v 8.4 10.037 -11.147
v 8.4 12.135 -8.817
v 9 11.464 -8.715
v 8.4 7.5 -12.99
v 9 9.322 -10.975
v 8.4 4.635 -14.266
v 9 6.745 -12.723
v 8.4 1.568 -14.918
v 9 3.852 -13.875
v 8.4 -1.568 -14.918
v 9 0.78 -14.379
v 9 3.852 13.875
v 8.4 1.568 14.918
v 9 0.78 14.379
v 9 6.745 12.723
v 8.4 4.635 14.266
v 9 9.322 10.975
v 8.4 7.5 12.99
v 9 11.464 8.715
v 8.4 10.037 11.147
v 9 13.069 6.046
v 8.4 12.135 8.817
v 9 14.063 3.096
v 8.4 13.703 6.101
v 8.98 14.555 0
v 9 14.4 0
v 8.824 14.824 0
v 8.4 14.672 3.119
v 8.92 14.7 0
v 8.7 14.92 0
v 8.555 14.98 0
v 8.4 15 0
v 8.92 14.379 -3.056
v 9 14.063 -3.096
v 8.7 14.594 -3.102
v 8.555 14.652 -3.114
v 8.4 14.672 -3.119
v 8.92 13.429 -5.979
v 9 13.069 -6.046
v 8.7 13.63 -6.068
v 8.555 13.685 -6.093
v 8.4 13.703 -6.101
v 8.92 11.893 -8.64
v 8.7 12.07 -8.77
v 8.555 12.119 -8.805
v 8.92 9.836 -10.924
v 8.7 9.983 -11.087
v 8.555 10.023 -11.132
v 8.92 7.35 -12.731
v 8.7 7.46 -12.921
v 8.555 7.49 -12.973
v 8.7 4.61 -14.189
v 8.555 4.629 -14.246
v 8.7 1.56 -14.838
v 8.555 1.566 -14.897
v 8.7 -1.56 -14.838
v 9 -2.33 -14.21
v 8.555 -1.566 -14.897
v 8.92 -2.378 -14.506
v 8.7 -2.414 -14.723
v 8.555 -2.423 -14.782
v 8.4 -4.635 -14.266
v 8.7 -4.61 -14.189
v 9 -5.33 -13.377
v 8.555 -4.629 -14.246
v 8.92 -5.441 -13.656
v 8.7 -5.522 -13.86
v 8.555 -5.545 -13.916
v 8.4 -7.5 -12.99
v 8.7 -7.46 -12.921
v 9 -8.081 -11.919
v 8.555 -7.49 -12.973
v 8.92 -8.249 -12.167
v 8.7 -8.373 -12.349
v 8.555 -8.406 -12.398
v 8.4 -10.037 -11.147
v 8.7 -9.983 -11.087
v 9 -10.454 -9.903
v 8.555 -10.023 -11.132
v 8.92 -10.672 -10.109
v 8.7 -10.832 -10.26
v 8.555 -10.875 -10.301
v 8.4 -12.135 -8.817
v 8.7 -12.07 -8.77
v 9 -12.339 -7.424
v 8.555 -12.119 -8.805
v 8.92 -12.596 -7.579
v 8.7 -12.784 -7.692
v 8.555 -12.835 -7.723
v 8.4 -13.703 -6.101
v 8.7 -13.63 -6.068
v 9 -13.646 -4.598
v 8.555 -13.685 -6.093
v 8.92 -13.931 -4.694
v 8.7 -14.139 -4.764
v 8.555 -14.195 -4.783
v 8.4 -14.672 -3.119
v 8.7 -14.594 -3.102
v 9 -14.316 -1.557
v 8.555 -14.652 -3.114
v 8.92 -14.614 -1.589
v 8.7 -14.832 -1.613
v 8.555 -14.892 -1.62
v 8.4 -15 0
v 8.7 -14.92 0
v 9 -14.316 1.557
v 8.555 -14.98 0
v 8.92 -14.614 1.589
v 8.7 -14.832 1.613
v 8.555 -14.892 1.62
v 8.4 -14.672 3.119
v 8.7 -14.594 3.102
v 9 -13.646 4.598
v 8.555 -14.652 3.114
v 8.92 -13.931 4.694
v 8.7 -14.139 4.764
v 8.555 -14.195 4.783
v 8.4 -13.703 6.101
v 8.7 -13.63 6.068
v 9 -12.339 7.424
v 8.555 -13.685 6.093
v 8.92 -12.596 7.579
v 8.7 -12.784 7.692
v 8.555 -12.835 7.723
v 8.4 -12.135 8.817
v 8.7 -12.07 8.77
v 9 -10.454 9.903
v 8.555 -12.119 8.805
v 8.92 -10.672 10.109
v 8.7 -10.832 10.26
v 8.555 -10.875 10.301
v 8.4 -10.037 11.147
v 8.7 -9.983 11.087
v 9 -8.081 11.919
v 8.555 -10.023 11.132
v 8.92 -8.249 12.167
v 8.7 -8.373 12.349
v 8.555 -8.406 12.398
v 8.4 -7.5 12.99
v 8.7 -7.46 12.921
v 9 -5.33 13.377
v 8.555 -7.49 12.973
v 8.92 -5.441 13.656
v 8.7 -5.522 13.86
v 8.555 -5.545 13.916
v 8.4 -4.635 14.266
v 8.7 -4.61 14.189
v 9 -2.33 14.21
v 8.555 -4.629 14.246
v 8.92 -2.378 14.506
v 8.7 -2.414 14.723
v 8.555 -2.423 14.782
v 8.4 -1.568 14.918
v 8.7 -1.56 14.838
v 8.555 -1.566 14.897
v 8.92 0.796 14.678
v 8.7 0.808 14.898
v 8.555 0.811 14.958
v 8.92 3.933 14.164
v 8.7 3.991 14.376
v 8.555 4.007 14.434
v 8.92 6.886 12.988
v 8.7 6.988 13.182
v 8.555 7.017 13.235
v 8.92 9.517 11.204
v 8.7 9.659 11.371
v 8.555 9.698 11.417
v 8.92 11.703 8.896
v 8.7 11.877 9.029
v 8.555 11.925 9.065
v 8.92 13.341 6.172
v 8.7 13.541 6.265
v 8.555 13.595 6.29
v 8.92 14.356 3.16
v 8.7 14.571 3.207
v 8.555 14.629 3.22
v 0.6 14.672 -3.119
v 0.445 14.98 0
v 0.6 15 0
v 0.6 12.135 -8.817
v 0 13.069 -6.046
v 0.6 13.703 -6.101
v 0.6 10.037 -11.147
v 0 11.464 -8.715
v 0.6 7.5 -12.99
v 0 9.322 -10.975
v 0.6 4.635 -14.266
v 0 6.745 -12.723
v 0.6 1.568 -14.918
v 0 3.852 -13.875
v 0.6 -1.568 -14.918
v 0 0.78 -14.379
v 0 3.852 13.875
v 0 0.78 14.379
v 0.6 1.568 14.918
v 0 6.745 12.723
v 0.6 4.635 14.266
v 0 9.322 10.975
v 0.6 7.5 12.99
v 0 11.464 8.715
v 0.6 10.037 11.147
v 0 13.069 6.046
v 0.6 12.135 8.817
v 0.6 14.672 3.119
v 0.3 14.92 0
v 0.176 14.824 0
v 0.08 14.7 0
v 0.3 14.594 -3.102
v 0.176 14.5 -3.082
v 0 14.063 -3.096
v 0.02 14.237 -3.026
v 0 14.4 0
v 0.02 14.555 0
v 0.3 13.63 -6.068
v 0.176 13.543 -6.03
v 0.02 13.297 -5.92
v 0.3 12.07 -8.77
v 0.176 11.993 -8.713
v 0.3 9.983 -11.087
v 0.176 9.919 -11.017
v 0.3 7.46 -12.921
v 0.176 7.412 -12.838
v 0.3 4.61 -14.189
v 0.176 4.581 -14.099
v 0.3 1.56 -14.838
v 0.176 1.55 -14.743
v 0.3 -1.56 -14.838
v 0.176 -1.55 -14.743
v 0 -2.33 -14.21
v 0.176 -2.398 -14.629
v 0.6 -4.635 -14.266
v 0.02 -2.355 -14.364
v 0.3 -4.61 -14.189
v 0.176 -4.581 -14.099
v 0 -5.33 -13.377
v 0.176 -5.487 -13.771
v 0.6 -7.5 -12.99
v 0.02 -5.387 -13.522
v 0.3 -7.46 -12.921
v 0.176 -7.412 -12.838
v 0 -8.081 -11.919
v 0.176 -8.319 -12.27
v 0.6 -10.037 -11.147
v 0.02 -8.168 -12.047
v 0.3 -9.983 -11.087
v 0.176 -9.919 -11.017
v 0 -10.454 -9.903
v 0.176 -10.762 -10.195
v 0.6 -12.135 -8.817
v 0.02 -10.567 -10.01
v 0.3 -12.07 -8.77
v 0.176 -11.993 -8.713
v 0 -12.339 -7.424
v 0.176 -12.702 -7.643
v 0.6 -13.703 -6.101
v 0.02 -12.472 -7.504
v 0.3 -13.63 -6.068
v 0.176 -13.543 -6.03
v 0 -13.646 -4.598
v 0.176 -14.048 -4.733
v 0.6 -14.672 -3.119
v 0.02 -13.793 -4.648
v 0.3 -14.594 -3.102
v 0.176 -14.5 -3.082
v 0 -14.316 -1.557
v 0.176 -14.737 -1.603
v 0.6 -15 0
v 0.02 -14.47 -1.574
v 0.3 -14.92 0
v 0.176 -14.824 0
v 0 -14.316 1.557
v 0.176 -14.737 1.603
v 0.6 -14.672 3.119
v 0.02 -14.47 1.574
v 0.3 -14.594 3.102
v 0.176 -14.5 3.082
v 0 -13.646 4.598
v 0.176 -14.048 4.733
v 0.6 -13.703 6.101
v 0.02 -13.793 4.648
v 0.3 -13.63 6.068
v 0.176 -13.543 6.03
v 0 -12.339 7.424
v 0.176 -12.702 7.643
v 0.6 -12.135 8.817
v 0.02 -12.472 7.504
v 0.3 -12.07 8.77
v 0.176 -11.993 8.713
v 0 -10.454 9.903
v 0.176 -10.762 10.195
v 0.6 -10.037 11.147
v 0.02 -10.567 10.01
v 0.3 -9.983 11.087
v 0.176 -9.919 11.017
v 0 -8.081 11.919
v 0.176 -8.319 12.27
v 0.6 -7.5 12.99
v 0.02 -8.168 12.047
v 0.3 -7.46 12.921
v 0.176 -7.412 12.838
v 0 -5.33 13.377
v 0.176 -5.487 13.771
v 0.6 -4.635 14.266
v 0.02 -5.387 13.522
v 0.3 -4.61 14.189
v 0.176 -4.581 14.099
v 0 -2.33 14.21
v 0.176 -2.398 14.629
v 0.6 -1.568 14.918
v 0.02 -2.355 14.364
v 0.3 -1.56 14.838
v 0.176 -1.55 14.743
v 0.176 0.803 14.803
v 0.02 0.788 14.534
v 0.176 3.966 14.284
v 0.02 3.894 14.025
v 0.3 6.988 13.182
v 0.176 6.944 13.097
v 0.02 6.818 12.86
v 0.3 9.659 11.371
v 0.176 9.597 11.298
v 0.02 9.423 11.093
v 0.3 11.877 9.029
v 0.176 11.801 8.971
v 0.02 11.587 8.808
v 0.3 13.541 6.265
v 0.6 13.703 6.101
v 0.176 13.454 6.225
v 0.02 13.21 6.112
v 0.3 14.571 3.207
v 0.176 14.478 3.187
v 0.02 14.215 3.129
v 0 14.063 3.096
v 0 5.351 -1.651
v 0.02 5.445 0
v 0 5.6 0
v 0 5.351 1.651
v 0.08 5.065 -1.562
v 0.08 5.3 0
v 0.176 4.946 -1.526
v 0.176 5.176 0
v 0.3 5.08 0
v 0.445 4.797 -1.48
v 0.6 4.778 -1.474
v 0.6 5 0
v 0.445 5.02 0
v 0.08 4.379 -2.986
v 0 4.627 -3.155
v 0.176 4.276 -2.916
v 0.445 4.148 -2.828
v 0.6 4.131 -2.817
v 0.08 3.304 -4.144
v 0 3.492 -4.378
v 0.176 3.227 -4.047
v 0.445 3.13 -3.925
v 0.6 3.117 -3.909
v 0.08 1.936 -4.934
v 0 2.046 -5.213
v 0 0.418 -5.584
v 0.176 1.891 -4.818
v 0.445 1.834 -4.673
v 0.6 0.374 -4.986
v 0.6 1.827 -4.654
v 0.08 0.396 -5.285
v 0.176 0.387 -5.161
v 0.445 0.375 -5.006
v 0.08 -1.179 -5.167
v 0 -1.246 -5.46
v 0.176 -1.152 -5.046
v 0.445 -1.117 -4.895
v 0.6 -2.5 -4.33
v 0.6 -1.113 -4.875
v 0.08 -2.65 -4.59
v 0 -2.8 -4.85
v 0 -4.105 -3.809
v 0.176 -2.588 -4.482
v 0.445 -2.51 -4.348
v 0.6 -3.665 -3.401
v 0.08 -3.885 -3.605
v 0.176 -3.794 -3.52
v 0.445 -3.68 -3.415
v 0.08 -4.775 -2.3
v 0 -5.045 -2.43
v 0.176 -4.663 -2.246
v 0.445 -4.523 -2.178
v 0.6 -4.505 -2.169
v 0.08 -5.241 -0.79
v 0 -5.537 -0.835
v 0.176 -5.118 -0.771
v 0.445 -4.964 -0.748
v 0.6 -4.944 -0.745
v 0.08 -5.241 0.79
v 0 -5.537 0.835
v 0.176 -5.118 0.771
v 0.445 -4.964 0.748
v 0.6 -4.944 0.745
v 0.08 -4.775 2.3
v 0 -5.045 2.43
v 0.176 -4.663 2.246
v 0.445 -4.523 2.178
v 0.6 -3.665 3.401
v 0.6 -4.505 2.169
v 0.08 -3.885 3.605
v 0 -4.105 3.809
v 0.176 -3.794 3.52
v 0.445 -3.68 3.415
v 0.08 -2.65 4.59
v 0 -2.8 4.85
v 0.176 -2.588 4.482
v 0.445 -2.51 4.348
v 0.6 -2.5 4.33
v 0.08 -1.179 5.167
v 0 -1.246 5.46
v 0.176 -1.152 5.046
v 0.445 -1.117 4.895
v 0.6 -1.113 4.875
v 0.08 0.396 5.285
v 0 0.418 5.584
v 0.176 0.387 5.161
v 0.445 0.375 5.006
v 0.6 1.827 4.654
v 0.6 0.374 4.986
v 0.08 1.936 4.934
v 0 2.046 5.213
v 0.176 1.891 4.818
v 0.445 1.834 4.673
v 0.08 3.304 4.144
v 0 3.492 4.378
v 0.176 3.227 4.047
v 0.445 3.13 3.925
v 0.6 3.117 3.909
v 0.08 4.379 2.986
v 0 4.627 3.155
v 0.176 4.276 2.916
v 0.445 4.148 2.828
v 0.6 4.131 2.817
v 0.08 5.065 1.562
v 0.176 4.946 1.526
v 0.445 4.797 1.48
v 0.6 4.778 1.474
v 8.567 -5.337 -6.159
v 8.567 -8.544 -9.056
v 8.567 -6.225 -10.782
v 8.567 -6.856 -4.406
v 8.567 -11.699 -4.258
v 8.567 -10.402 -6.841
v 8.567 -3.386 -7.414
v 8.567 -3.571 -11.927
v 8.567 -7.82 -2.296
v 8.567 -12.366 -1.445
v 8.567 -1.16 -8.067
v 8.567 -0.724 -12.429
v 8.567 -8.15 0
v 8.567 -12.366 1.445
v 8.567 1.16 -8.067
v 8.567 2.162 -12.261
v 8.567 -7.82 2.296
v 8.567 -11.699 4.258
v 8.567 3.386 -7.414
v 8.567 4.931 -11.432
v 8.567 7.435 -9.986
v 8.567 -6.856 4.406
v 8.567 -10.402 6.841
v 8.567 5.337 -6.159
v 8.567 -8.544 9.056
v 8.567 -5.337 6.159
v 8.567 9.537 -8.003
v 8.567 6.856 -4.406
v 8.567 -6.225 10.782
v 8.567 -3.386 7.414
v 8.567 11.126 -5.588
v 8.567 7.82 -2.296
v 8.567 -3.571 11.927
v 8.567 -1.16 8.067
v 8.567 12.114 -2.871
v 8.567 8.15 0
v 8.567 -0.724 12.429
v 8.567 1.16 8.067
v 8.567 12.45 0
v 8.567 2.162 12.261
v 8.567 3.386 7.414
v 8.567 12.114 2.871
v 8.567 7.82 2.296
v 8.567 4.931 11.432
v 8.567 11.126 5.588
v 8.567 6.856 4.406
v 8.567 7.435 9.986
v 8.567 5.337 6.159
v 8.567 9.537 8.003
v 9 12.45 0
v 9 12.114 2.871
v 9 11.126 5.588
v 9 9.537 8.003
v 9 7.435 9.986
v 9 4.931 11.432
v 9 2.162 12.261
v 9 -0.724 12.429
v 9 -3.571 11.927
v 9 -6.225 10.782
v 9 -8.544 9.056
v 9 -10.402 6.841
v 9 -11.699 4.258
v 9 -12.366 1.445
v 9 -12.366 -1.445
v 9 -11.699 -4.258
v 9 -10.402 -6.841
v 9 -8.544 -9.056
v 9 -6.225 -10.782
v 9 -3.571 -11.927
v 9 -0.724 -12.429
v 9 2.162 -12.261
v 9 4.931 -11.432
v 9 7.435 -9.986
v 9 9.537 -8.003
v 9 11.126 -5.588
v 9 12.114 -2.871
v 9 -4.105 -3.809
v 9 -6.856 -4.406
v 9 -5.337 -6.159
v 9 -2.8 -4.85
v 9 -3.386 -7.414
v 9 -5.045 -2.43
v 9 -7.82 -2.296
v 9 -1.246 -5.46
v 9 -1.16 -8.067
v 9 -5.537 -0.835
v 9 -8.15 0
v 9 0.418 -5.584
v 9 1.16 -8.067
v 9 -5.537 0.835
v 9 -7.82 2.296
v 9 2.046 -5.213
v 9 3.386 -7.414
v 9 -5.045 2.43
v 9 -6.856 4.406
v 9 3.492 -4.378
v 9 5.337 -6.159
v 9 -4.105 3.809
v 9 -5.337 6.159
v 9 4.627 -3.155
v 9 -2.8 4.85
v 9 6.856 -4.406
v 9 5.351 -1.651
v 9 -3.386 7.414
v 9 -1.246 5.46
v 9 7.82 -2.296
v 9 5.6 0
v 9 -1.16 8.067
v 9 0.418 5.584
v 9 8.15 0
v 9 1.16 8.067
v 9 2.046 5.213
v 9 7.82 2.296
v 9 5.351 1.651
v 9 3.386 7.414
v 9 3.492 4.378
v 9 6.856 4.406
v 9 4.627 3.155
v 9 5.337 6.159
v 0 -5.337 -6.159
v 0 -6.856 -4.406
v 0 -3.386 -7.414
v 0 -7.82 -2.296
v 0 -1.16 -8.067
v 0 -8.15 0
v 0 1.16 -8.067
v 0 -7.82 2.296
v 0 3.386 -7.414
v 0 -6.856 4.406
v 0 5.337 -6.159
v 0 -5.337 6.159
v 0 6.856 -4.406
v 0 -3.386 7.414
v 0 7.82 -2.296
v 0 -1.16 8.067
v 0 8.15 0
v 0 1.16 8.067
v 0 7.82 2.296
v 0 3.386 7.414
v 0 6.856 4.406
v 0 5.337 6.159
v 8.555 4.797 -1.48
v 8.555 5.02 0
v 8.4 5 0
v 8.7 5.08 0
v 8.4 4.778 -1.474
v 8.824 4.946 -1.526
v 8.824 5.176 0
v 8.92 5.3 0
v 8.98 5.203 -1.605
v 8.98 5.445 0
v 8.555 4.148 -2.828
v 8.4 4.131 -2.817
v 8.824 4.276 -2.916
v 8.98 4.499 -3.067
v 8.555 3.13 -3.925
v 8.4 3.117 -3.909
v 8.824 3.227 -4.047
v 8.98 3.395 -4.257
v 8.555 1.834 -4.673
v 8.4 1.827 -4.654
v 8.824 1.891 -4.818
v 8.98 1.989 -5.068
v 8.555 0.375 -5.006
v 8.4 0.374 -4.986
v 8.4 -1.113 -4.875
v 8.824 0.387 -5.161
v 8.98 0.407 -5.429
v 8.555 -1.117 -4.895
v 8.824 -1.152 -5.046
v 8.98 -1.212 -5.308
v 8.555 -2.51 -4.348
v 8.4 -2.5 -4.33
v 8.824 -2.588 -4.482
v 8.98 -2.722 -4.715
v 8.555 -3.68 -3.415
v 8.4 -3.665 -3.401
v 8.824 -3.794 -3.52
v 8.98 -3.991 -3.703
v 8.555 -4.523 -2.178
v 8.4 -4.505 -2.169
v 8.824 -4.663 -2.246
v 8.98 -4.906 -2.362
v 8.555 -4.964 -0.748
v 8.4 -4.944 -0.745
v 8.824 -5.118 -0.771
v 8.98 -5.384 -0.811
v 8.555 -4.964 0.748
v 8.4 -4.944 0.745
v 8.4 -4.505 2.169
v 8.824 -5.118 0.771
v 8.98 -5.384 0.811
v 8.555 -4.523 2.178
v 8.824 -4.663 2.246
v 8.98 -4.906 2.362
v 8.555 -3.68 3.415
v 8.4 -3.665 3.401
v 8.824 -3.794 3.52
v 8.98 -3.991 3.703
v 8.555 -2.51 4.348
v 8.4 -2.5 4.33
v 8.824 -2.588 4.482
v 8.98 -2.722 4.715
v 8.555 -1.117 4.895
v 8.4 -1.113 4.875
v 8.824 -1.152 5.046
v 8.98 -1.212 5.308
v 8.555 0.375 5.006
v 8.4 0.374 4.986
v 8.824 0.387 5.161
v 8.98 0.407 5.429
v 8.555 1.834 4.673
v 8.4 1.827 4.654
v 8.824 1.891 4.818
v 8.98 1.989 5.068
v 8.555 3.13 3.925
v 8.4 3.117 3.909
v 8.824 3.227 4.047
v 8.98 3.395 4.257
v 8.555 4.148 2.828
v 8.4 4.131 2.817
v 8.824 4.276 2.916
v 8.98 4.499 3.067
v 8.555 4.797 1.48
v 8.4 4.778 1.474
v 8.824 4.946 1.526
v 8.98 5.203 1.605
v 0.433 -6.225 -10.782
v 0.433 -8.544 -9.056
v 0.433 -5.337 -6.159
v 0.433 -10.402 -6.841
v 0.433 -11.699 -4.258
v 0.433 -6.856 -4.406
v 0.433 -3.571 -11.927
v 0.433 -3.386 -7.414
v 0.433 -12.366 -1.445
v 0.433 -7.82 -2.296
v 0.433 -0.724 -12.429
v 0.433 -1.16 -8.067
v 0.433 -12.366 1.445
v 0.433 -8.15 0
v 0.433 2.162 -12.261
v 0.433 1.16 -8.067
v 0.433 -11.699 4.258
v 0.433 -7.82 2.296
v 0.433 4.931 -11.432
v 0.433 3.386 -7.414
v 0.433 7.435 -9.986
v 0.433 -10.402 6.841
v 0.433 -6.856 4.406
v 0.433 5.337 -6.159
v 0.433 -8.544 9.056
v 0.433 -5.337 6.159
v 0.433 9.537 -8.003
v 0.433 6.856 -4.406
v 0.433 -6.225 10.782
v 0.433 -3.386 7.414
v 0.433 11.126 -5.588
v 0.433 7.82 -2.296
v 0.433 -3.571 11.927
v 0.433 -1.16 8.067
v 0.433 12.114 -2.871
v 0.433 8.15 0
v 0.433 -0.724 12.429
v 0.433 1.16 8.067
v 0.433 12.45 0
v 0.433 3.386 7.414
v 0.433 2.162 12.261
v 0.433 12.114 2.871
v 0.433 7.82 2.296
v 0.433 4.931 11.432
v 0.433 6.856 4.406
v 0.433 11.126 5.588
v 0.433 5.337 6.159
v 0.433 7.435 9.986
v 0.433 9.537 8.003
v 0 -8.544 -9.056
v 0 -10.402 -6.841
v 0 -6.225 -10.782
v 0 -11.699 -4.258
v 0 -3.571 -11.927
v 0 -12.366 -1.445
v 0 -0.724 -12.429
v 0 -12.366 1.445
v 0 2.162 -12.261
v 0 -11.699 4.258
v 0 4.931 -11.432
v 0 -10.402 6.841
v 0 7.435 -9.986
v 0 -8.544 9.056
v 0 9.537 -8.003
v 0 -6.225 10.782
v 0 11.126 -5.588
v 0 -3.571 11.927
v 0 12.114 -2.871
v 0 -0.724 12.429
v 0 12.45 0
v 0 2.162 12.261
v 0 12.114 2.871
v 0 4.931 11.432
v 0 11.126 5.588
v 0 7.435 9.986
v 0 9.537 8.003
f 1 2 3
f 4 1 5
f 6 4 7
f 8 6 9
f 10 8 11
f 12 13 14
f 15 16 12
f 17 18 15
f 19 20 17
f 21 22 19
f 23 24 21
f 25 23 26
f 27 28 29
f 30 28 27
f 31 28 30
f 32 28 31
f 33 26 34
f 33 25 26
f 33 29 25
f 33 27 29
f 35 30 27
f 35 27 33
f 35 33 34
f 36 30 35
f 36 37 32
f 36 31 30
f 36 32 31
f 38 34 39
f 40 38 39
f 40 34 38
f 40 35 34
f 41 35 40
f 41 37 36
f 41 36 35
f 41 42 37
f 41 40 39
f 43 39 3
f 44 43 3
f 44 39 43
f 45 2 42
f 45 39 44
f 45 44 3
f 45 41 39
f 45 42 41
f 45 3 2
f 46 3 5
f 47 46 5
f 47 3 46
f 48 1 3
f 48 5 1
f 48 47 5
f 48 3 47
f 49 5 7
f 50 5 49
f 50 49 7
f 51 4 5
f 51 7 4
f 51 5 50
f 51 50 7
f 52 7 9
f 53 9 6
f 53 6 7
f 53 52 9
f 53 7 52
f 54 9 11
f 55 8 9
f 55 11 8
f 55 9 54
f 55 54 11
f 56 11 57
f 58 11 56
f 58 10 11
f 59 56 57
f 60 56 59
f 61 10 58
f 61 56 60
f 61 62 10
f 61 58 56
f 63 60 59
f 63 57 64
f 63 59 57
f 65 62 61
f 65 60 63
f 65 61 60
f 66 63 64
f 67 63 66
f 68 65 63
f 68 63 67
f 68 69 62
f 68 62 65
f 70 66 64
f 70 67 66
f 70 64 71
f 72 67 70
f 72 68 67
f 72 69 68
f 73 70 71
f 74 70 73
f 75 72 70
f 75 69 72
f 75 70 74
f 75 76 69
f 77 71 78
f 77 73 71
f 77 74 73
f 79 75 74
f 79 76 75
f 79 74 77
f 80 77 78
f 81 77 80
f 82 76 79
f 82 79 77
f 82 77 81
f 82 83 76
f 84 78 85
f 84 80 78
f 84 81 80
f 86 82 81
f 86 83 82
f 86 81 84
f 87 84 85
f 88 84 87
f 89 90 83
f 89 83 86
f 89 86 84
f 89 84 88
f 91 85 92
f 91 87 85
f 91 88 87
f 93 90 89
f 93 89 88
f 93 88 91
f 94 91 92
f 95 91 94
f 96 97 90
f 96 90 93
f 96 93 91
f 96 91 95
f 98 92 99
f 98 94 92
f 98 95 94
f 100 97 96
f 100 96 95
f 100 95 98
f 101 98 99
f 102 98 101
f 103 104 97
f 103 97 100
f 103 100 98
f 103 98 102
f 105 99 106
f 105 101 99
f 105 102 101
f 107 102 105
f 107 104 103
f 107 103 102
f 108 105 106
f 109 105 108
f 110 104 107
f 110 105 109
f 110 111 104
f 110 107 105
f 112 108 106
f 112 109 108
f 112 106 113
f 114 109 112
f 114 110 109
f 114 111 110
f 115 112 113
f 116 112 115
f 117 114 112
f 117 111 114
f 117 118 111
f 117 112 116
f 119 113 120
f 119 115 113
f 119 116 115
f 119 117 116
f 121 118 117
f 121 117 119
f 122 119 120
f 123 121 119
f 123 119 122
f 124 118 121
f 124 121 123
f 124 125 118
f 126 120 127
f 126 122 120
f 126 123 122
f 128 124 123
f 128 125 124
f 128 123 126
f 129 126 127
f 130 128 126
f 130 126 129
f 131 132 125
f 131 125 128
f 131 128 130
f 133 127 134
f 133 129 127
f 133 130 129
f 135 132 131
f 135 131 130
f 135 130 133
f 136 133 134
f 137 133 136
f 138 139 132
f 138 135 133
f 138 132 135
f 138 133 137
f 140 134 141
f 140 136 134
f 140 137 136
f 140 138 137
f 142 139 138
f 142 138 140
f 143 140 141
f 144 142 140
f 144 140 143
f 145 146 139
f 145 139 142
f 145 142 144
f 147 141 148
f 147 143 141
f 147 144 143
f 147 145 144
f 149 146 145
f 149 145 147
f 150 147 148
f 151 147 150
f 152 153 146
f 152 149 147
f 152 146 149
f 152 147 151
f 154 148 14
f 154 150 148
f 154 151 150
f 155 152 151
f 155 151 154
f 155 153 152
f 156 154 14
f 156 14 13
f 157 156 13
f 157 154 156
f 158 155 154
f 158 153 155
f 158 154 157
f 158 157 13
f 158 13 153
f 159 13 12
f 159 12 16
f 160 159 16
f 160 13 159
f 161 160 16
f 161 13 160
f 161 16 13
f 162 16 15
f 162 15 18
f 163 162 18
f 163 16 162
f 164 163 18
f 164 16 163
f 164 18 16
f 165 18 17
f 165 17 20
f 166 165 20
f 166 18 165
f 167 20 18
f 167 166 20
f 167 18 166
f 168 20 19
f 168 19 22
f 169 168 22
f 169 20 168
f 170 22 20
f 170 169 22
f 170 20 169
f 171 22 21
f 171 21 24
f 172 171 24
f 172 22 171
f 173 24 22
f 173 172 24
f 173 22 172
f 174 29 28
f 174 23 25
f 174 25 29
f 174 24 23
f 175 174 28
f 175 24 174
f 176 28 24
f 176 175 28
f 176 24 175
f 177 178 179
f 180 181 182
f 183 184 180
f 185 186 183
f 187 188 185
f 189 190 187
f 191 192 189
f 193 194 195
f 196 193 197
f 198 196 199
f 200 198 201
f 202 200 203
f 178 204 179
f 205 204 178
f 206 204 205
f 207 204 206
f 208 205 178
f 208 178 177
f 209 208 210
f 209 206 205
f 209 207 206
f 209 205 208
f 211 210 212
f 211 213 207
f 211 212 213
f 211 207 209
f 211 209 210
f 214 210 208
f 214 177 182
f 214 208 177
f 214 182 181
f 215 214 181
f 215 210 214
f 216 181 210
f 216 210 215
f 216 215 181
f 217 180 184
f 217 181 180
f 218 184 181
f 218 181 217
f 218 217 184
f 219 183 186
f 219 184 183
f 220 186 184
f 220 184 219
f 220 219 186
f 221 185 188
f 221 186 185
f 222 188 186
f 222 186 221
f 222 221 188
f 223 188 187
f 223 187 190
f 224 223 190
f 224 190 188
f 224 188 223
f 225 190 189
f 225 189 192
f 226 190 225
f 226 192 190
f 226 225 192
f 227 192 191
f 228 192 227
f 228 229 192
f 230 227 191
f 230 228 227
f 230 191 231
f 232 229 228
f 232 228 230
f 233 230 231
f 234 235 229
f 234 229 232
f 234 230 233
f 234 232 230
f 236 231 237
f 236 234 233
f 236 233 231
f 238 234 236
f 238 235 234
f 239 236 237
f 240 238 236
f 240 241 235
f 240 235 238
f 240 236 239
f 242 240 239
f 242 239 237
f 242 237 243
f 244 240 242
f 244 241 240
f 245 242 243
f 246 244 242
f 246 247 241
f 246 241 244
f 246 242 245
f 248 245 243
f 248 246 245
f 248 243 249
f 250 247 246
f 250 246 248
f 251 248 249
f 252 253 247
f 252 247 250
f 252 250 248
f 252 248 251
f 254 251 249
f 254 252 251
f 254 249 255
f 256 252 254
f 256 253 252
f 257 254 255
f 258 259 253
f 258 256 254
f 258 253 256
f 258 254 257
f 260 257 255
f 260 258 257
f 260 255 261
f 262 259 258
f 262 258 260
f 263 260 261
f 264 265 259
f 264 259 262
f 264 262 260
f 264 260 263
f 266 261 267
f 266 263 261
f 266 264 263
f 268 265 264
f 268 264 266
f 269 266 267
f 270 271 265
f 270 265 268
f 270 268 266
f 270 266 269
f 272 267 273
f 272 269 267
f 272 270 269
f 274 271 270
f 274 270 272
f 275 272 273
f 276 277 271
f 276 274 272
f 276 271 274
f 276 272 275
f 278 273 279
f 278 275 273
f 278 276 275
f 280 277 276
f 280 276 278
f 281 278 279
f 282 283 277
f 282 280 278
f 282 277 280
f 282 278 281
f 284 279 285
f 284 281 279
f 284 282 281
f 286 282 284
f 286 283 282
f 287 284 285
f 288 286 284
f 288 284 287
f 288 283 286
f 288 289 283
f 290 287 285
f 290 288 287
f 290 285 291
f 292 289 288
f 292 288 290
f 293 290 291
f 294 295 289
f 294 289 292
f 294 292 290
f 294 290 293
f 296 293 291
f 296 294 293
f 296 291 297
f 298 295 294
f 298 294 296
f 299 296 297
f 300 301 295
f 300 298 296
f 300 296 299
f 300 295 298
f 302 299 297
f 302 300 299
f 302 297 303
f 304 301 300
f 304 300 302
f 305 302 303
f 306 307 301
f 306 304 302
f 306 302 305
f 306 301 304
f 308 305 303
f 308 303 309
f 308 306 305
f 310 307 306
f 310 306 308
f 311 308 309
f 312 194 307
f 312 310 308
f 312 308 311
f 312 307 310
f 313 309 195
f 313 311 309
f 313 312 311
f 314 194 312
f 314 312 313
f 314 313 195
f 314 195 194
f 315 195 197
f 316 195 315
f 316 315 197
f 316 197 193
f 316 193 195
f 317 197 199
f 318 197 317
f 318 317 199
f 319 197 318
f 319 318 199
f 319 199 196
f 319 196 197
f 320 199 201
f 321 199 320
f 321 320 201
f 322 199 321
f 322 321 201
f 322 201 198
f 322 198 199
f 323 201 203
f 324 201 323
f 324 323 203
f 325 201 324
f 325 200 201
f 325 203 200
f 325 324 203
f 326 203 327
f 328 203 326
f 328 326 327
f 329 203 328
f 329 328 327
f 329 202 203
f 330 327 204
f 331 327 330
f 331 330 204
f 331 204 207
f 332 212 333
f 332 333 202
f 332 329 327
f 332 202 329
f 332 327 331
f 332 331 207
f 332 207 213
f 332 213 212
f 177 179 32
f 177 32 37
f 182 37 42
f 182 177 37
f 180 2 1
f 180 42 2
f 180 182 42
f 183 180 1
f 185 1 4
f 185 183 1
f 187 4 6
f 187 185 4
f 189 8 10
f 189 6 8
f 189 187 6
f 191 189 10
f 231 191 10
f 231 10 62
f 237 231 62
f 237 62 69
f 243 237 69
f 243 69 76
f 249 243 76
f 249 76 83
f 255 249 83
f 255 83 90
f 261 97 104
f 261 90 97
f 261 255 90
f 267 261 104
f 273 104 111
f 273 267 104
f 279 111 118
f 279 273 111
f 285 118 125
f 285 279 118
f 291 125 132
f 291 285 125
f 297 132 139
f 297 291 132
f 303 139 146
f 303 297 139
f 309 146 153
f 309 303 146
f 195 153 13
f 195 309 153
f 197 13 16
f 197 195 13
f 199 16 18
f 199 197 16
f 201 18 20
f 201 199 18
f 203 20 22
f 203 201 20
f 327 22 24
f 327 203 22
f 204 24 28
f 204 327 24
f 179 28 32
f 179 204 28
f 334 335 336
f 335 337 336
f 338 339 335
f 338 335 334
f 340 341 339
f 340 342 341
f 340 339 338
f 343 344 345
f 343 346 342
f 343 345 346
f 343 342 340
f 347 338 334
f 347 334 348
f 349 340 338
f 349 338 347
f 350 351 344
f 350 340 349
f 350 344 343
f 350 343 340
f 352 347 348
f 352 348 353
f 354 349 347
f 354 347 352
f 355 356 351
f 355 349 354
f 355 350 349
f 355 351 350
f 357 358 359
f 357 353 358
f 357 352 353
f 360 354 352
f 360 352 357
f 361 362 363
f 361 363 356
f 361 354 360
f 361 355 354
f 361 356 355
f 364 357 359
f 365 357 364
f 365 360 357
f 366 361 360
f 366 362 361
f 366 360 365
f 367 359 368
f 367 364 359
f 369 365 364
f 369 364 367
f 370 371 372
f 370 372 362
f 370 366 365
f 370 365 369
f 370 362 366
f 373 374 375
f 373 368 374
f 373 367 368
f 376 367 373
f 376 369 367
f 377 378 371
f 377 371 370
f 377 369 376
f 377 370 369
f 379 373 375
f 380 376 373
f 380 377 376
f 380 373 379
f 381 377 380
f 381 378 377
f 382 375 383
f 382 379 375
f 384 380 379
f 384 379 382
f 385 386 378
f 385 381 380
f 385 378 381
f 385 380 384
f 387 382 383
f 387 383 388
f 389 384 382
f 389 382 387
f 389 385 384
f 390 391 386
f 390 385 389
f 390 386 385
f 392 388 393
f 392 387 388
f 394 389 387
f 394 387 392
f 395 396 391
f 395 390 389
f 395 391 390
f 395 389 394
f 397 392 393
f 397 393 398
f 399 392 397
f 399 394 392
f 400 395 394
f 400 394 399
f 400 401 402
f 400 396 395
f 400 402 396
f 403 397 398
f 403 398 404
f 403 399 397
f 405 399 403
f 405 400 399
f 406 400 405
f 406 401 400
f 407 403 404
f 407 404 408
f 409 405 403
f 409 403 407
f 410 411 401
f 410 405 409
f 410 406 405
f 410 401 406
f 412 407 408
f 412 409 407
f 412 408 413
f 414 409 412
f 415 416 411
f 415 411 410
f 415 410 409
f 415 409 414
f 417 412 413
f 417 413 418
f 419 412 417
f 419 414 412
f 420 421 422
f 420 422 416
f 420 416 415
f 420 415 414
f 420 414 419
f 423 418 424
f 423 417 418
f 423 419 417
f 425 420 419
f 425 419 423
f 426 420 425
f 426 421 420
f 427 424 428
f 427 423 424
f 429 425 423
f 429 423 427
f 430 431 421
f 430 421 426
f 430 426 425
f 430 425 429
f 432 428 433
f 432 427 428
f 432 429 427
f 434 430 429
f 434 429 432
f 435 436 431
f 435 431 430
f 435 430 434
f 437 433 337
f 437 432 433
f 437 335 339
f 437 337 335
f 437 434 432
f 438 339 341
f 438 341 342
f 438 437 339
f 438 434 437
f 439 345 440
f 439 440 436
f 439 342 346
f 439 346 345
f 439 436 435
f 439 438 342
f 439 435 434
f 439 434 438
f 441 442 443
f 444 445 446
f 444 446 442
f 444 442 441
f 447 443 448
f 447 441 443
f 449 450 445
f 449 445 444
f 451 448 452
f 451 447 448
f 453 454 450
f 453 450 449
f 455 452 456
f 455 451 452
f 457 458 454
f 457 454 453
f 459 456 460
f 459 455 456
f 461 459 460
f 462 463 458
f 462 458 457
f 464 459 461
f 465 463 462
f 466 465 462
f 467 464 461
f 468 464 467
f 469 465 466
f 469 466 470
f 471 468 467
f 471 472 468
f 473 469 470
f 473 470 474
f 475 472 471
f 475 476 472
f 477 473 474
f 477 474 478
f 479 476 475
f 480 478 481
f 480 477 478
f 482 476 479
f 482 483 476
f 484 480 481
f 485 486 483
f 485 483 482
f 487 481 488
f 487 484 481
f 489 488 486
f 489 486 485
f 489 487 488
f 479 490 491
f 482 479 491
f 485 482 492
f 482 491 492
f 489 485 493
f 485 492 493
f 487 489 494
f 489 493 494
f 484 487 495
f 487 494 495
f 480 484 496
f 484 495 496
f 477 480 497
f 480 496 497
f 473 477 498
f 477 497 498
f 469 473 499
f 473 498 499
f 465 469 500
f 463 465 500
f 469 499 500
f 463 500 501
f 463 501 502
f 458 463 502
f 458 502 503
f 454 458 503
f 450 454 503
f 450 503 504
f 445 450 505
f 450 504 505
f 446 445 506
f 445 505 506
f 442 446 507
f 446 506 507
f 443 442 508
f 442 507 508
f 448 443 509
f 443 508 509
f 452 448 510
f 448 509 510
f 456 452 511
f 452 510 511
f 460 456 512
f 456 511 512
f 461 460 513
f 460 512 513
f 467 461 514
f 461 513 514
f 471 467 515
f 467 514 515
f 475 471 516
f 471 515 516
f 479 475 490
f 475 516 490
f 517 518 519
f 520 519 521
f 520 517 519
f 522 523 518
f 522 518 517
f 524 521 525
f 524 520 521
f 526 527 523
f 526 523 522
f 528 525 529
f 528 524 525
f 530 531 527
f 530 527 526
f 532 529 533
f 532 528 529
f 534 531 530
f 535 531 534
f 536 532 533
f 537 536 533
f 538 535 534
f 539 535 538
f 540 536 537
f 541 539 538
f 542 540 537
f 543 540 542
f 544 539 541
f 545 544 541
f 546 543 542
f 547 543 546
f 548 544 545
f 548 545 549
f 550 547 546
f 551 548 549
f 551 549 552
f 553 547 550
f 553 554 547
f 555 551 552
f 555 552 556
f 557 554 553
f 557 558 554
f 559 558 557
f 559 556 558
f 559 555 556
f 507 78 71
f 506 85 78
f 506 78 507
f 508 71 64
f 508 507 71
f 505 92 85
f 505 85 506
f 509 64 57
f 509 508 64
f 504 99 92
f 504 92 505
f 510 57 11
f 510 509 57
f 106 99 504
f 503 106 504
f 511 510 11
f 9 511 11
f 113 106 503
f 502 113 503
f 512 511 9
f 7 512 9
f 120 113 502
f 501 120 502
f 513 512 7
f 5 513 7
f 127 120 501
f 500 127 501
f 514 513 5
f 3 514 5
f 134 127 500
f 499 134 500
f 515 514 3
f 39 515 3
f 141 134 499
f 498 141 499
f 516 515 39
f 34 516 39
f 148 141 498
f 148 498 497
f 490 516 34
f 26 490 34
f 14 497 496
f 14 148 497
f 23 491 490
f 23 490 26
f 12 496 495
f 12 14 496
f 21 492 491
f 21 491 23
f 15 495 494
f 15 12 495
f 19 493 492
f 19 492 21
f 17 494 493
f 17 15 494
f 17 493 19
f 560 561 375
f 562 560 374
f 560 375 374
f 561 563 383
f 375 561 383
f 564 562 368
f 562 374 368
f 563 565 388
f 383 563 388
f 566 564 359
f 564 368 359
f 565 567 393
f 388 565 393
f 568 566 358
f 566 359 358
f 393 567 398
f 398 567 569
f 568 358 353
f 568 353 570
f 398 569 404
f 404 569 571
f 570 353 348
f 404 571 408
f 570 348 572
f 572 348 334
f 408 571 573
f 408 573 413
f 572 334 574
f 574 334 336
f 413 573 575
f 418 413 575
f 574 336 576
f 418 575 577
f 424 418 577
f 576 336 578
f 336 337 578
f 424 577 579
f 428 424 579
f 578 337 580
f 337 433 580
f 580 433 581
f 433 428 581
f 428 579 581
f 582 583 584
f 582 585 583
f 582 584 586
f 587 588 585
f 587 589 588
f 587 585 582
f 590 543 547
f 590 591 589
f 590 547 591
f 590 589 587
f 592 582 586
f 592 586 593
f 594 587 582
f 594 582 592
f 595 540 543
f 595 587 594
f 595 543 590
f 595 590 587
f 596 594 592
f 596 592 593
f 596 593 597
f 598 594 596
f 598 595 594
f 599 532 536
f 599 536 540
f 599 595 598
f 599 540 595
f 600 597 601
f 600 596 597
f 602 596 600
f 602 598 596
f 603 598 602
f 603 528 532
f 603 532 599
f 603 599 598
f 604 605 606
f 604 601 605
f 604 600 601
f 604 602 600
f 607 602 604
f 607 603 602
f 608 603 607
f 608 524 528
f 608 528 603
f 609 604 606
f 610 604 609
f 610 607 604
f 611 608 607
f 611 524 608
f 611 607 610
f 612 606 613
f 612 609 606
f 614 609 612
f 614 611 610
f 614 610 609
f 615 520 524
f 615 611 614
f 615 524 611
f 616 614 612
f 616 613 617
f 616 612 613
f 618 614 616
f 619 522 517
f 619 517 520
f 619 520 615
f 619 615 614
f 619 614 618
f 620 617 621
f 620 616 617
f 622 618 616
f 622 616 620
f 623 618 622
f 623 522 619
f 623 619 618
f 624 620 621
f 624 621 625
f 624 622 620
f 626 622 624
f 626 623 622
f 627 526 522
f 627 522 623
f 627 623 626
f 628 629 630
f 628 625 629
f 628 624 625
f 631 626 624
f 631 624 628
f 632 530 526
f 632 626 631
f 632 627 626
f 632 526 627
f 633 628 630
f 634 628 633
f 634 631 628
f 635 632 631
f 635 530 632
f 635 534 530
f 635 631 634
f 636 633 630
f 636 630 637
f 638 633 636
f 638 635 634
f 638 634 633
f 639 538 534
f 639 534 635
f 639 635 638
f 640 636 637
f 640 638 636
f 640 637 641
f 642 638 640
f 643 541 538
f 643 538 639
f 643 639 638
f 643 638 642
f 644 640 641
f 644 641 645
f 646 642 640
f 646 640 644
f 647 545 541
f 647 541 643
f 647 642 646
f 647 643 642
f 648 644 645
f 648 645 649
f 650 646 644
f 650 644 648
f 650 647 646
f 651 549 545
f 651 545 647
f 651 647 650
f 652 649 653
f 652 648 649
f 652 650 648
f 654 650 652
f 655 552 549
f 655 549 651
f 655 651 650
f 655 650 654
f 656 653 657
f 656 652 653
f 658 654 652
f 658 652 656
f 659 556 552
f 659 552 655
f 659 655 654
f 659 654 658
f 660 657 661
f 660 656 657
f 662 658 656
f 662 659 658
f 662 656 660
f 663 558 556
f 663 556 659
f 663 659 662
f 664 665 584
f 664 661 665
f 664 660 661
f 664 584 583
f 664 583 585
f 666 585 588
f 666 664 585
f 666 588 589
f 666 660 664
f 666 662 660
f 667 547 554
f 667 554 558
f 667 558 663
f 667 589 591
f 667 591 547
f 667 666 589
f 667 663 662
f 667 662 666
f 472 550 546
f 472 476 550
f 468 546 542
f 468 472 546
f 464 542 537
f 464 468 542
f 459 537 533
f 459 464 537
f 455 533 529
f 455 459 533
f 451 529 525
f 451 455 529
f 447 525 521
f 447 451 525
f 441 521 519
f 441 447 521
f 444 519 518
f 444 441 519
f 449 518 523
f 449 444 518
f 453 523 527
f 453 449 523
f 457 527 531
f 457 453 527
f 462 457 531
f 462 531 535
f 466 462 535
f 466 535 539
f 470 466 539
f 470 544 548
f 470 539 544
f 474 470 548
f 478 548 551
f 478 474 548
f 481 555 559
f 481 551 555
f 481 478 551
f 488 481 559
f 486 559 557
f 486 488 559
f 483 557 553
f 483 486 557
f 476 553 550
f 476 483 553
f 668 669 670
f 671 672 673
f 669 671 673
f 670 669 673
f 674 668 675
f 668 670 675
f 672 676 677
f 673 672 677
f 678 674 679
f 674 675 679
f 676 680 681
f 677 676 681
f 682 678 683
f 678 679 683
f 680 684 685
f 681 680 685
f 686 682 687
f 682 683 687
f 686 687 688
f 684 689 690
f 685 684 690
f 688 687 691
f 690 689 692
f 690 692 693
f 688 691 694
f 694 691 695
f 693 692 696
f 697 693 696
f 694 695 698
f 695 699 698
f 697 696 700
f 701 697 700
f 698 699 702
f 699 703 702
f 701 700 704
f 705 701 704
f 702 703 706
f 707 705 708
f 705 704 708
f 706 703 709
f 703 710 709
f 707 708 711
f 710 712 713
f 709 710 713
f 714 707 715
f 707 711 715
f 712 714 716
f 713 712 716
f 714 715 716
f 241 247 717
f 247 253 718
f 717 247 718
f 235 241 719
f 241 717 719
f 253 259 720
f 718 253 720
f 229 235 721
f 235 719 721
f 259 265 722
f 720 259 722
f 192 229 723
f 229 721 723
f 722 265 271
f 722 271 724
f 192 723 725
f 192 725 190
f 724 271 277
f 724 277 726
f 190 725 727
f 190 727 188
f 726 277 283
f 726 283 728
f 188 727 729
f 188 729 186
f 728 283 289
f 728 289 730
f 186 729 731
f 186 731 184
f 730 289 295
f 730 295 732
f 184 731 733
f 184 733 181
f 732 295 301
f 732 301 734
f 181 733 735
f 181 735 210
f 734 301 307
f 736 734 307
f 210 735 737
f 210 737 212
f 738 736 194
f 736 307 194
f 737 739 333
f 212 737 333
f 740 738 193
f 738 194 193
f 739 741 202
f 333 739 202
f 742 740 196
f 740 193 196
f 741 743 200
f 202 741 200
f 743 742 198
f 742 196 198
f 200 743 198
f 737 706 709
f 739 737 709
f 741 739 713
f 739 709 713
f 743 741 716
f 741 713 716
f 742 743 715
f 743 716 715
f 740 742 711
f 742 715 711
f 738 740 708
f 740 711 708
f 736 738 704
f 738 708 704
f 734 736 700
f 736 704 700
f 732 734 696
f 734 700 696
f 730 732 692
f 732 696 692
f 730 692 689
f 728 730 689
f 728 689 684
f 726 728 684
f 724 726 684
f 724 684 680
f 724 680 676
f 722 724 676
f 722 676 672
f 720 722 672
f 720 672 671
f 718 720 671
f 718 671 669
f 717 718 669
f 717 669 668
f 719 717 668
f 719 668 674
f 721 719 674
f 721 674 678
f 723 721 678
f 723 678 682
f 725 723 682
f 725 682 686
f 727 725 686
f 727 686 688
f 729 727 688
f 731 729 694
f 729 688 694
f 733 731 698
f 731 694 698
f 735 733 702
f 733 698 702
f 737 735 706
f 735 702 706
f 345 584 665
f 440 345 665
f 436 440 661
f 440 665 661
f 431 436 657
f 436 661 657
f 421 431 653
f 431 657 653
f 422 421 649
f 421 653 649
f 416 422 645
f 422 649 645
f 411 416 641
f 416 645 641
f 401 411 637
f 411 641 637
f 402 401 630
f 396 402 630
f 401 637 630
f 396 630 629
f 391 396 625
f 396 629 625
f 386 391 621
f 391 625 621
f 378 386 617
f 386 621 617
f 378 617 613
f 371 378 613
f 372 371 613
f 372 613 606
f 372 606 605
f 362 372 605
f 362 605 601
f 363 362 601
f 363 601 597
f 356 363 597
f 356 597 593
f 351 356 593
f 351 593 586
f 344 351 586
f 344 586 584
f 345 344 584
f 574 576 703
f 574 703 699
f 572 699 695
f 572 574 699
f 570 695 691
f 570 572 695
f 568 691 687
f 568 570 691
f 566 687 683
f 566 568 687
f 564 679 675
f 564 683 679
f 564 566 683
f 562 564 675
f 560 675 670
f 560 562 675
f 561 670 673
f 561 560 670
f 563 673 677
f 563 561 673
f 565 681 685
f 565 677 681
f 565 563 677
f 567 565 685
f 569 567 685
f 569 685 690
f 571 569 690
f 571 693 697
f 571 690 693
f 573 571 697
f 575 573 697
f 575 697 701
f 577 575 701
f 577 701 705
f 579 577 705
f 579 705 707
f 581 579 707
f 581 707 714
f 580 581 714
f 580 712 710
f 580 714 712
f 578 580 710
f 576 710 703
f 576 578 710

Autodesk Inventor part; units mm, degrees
sketch "Sketch_1" plane through (0, 0, 0) normal (0, 0, 1) x (1, 0, 0)
  line L0 (9, 0) -> (0, 0)
  arc A0 (0, 5.6) -> (0.6, 5) centre (0.6, 5.6) ccw
  line L1 (0.6, 5) -> (8.4, 5)
  arc A1 (8.4, 5) -> (9, 5.6) centre (8.4, 5.6) ccw
  line L2 (9, 5.6) -> (9, 8.15)
  line L3 (9, 8.15) -> (8.567, 8.15)
  line L4 (8.567, 8.15) -> (8.567, 12.45)
  line L5 (8.567, 12.45) -> (9, 12.45)
  line L6 (9, 12.45) -> (9, 14.4)
  arc A2 (9, 14.4) -> (8.4, 15) centre (8.4, 14.4) ccw
  line L7 (8.4, 15) -> (0.6, 15)
  arc A3 (0.6, 15) -> (0, 14.4) centre (0.6, 14.4) ccw
  line L8 (0, 14.4) -> (0, 12.45)
  line L9 (0, 12.45) -> (0.433, 12.45)
  line L10 (0.433, 12.45) -> (0.433, 8.15)
  line L11 (0.433, 8.15) -> (0, 8.15)
  line L12 (0, 8.15) -> (0, 5.6)
revolve "Revolution1" add sketch "Sketch_1" angle 360 about axis through (9, 0, 0) along (1, 0, 0)
ref_plane "center_point_XY" through (4.5, 0, 0) normal (1, 0, 0) x (0, 0, -1)
ref_plane "center_point_YZ" through (4.5, 0, 0) normal (0, 0, -1) x (0, 1, 0)
ref_plane "center_point_ZX" through (4.5, 0, 0) normal (0, 1, 0) x (1, 0, 0)
ref_plane "to_housing_XY" through (0, 0, 0) normal (1, 0, 0) x (0, 0, -1)
ref_plane "to_housing_YZ" through (0, 0, 0) normal (0, 0, -1) x (0, 1, 0)
ref_plane "to_housing_ZX" through (0, 0, 0) normal (0, 1, 0) x (1, 0, 0)
ref_plane "to_ring_XY" through (8.134, 0, 0) normal (1, 0, 0) x (0, 0, -1)
ref_plane "to_ring_YZ" through (8.134, 0, 0) normal (0, 0, -1) x (0, 1, 0)
ref_plane "to_ring_ZX" through (8.134, 0, 0) normal (0, 1, 0) x (1, 0, 0)
properties part number "bearing_6200"
